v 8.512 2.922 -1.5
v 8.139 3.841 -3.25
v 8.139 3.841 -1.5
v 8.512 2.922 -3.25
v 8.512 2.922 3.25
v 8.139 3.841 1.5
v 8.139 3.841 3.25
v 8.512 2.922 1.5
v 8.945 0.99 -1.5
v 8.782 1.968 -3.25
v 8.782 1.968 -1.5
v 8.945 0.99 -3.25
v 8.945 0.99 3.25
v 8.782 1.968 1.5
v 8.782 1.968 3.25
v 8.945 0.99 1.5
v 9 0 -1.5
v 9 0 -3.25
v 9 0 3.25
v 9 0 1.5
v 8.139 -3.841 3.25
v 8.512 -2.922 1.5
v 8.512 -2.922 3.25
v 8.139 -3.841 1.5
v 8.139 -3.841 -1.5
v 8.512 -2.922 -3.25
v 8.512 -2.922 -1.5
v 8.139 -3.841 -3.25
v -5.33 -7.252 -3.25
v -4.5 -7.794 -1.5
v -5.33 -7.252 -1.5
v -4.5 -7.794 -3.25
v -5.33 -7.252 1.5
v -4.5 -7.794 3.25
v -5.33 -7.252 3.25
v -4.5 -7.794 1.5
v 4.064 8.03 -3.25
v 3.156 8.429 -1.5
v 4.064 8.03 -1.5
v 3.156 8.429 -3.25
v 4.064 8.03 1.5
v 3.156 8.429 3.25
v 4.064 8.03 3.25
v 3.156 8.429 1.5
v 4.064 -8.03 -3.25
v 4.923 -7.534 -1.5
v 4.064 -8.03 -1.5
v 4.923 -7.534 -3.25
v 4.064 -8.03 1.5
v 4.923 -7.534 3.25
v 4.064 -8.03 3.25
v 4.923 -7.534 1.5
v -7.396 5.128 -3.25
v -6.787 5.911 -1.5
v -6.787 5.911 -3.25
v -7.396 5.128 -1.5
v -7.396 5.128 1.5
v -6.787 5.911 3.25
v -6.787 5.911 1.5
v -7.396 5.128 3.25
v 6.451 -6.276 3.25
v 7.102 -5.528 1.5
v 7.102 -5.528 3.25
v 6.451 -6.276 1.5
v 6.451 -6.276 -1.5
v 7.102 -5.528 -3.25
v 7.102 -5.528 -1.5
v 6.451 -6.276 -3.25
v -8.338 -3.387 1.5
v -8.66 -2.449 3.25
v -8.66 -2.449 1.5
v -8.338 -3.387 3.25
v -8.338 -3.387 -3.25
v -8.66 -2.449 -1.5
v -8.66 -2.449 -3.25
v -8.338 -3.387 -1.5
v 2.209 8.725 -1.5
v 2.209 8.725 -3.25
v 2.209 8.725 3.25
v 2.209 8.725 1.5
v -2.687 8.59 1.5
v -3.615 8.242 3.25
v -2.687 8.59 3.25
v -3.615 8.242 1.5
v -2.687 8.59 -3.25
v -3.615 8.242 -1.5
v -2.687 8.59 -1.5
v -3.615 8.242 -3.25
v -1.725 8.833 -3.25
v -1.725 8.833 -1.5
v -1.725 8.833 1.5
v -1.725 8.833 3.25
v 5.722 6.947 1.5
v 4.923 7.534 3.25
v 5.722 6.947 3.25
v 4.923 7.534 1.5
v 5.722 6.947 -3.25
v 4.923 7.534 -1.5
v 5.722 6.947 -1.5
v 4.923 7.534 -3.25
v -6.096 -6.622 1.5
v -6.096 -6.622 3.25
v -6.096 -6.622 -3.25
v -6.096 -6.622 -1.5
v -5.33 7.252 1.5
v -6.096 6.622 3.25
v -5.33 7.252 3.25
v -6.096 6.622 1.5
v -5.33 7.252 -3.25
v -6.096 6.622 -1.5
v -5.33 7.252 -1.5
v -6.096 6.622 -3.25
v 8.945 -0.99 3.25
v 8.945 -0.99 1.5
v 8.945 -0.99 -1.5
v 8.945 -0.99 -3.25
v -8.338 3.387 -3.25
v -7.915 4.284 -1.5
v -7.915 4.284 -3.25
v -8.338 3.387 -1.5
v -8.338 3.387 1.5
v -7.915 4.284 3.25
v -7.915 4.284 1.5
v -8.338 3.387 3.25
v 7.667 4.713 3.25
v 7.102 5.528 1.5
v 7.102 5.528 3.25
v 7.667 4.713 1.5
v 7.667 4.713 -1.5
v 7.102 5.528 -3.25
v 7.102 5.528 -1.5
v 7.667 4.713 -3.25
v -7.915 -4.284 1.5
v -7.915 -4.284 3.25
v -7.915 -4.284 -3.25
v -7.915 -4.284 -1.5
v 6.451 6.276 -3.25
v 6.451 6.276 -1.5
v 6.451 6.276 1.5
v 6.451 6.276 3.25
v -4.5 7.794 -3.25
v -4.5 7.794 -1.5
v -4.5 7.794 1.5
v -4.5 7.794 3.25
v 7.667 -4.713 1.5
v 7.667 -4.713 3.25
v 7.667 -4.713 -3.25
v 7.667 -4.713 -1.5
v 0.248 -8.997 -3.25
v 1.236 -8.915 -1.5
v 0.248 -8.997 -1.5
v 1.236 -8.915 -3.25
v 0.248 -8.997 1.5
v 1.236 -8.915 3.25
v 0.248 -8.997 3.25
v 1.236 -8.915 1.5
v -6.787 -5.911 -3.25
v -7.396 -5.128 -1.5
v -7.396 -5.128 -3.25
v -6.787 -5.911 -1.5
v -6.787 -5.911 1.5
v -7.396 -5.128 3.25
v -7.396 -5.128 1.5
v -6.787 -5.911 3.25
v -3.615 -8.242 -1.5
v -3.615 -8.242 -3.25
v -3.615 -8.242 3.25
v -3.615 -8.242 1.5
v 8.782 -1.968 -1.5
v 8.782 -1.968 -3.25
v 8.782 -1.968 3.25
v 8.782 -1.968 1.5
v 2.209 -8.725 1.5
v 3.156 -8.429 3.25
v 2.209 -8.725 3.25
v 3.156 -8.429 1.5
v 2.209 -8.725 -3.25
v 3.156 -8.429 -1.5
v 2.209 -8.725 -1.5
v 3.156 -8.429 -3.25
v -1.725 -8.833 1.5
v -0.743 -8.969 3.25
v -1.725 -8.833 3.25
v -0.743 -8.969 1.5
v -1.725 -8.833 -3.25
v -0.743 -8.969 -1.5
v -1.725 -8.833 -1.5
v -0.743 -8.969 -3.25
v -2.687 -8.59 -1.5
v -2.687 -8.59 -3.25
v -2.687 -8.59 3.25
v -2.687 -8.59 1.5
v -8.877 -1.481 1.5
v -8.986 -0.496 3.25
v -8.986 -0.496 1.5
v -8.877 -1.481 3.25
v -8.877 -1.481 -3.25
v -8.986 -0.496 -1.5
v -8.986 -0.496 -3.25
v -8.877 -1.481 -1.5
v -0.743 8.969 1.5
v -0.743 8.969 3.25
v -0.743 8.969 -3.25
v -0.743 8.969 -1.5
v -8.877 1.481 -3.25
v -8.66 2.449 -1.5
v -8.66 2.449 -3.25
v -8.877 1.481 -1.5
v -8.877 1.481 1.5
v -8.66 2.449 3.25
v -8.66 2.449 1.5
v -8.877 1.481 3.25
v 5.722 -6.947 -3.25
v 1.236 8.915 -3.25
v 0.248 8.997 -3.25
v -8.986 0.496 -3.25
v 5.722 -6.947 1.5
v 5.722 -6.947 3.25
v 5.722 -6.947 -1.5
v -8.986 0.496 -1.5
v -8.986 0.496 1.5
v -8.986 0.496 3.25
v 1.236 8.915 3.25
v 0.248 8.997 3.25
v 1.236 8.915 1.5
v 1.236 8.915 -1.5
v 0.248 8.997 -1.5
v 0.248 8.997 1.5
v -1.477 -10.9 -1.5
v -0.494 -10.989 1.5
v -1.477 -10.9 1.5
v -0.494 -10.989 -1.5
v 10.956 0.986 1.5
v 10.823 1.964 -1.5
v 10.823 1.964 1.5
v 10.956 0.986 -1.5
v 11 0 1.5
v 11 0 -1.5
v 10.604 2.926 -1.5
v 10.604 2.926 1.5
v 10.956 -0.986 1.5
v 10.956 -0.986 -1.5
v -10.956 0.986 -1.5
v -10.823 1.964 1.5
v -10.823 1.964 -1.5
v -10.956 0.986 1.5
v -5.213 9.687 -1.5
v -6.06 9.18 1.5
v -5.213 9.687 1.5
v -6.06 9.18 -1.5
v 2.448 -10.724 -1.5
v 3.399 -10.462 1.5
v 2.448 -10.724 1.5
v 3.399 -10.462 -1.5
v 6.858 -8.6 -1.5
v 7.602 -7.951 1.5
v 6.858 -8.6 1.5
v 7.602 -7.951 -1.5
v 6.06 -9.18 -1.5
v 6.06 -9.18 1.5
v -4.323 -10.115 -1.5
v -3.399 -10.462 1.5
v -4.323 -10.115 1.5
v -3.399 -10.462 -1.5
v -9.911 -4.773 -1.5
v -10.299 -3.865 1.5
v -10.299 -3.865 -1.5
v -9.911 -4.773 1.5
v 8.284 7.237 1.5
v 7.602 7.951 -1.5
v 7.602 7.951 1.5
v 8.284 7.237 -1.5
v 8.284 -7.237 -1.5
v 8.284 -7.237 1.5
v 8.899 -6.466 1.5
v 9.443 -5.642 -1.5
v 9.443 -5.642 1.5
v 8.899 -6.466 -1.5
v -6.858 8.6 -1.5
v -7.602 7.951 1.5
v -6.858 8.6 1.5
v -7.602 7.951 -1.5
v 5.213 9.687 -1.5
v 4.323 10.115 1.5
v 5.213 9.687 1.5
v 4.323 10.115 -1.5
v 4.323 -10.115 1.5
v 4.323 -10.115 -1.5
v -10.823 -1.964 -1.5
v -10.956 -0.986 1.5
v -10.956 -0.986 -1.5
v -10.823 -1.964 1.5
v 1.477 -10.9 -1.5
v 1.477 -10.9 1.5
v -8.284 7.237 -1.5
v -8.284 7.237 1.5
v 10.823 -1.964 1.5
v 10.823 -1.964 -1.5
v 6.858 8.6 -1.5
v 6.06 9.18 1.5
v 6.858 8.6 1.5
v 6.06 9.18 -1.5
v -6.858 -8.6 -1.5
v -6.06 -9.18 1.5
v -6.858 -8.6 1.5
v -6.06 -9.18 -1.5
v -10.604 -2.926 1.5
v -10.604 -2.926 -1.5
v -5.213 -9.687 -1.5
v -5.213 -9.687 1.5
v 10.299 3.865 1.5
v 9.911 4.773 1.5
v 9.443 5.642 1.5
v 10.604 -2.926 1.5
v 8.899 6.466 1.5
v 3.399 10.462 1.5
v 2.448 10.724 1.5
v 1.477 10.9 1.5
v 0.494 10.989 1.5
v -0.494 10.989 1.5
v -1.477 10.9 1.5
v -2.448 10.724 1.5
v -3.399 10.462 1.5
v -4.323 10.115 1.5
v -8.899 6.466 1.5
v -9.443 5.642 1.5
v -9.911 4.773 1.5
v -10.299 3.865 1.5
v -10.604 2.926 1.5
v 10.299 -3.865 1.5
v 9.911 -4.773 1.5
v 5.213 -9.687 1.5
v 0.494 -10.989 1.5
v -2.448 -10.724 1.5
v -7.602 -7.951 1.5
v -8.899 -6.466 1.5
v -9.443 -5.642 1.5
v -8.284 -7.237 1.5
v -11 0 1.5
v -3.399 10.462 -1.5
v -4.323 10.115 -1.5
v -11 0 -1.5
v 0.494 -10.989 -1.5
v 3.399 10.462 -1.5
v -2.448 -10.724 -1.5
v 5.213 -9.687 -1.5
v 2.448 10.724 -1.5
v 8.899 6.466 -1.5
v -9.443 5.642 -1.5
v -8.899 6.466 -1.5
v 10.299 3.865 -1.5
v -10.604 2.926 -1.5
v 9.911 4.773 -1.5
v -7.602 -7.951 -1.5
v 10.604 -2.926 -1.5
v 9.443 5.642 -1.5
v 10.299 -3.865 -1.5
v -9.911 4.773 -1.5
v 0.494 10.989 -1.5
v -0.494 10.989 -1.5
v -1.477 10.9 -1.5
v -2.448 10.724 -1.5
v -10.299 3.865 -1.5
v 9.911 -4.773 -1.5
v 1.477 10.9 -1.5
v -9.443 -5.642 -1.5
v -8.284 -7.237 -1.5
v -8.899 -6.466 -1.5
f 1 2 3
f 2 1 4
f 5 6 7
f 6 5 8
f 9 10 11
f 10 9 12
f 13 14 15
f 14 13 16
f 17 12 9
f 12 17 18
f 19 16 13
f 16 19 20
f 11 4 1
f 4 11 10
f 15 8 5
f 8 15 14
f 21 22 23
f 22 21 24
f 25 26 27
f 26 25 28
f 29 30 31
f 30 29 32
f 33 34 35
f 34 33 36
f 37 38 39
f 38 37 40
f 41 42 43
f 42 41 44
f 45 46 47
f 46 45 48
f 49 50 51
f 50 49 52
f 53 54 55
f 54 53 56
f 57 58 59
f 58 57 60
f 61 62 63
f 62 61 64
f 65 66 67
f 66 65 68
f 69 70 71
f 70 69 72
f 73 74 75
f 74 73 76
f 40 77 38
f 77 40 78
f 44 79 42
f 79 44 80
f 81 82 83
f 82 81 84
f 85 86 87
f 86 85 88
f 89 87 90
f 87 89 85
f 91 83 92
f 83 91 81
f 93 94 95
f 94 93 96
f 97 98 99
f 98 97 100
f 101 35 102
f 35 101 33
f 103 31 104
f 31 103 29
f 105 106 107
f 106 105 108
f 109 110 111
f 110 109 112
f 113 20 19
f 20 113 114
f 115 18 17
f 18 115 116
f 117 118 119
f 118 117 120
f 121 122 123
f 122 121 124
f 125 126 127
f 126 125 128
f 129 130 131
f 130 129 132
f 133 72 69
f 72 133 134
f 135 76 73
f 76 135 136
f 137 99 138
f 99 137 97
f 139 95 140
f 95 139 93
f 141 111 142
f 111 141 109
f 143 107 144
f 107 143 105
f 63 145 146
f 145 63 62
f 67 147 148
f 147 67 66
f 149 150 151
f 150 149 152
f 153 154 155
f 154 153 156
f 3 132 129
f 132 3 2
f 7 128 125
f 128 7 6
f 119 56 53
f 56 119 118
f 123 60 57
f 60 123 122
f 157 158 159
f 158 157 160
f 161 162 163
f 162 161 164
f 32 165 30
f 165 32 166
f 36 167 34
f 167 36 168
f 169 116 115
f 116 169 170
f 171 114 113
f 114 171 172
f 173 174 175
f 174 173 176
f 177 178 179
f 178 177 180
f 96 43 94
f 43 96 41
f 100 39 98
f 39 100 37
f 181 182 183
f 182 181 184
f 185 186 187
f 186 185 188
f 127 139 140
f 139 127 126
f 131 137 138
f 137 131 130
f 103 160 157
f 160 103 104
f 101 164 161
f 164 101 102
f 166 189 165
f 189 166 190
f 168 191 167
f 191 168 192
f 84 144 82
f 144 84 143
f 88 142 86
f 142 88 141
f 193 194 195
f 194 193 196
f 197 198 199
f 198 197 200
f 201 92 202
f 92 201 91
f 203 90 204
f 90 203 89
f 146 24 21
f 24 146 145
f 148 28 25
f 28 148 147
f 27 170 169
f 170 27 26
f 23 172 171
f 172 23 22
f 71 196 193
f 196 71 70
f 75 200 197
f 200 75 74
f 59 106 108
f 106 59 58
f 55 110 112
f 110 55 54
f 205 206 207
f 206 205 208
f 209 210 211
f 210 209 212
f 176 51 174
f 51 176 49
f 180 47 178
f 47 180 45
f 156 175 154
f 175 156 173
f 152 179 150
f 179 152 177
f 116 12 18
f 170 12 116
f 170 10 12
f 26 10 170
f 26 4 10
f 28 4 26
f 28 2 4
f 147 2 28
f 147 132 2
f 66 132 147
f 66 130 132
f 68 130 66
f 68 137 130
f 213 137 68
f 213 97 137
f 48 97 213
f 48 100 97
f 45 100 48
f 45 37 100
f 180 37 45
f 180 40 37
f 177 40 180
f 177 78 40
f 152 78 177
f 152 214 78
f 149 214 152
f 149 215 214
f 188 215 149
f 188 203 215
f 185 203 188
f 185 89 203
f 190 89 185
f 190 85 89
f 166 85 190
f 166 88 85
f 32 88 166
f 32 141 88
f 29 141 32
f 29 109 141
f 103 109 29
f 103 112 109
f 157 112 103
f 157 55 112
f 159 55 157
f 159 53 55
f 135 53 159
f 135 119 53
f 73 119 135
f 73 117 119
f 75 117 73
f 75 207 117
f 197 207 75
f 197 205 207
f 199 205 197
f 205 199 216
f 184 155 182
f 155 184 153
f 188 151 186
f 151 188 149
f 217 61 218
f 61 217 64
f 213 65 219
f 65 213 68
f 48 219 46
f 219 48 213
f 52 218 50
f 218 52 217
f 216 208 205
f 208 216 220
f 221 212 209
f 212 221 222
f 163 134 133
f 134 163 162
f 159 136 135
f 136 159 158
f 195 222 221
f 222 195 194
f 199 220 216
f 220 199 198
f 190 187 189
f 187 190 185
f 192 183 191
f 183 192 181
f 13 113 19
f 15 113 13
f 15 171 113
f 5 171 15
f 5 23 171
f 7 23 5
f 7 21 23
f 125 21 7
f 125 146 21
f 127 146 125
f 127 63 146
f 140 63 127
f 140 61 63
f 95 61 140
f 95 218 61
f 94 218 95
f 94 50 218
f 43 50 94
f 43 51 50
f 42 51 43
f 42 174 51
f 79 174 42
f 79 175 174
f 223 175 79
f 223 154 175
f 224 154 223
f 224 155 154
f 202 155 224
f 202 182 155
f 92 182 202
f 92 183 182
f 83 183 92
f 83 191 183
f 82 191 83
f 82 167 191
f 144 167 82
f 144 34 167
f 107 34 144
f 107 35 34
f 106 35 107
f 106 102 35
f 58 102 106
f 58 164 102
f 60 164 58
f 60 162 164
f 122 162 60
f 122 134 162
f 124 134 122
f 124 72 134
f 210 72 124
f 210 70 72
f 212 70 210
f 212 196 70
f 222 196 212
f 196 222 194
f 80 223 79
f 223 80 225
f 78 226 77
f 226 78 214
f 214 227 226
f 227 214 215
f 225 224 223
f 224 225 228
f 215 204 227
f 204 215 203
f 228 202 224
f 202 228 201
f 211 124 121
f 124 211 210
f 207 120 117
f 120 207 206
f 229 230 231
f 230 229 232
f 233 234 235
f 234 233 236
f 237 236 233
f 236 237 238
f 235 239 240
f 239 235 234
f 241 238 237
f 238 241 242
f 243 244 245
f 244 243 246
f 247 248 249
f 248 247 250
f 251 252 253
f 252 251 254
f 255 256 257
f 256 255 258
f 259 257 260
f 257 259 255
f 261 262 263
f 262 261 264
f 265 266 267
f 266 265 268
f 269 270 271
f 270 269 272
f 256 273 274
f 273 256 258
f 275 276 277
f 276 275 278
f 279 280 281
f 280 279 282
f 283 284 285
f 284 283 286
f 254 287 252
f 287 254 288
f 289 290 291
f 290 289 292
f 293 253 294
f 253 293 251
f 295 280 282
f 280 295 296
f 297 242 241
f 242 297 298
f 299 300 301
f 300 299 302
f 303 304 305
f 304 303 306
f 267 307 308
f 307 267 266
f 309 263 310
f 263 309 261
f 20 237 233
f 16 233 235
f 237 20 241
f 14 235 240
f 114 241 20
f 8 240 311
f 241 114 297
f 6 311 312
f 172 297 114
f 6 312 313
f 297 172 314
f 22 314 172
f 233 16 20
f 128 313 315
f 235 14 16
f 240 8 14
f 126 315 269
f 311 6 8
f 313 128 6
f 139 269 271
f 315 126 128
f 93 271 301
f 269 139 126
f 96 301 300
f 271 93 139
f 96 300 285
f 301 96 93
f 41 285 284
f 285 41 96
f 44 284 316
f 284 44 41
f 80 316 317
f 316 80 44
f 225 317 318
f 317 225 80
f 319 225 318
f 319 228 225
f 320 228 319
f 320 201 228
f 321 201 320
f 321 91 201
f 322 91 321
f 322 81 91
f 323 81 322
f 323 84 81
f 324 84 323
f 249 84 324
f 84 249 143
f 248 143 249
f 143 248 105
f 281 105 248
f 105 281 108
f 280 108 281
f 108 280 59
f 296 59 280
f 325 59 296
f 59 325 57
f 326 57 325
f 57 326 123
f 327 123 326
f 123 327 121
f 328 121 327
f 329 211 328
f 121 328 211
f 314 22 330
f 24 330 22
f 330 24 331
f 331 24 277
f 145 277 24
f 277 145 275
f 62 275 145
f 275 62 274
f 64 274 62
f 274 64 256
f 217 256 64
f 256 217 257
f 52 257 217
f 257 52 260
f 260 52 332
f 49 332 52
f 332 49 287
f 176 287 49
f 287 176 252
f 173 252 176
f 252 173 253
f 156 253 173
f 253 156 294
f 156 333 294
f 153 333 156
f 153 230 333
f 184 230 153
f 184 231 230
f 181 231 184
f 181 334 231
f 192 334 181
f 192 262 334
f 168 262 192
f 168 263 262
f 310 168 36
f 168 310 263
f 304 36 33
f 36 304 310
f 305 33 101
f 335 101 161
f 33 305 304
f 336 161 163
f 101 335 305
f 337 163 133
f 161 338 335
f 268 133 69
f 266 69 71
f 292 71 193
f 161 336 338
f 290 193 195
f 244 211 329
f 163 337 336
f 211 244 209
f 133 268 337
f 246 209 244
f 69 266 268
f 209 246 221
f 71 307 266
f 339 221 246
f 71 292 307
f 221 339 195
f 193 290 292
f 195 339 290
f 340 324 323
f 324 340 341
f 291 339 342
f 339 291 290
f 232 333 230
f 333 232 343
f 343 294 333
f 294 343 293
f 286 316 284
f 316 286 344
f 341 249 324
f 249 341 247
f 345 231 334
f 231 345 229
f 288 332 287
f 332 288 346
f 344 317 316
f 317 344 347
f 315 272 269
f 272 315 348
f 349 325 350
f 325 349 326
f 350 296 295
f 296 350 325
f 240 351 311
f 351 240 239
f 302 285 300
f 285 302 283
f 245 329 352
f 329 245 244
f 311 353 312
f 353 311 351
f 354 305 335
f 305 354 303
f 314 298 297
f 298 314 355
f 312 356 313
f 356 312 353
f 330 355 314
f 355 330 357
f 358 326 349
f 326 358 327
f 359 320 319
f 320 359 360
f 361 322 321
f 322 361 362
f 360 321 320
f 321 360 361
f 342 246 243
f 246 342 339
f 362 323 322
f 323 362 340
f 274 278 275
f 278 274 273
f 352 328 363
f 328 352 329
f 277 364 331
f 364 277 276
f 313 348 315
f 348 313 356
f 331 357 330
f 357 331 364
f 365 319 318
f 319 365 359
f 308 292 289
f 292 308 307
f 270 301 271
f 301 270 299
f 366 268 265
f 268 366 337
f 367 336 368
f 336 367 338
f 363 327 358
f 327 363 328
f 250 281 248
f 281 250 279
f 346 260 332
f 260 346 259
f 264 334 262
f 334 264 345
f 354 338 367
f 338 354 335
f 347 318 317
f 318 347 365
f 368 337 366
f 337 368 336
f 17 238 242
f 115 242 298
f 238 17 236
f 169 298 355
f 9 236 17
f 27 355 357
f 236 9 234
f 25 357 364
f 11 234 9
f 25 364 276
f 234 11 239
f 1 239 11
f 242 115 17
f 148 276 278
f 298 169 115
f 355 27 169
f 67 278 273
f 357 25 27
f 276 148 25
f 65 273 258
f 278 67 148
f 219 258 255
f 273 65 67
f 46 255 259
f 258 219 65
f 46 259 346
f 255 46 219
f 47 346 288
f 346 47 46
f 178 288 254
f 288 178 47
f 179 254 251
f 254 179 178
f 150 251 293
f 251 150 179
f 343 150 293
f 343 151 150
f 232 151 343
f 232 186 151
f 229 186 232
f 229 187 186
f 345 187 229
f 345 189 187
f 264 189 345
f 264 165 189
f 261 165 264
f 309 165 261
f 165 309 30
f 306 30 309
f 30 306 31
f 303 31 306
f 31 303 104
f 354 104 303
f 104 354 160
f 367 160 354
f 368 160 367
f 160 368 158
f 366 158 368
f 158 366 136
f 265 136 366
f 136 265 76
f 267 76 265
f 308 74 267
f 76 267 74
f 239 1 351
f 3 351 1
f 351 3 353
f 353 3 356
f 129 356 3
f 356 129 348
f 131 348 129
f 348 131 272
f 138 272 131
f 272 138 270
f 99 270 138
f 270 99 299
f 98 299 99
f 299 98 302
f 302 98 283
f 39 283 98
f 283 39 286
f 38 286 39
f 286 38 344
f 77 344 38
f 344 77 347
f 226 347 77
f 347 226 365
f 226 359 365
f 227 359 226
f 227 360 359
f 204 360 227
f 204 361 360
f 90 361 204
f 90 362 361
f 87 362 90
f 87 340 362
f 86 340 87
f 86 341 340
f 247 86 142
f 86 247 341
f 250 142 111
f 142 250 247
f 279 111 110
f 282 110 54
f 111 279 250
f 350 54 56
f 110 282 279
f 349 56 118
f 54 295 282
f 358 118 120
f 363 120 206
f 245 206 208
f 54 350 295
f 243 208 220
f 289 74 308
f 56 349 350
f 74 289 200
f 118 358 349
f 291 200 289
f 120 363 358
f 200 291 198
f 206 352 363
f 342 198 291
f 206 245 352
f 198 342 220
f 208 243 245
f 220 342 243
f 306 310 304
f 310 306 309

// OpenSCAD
$fa = 1;
$fs = 1;

cylinder(h=6.5, d=18, center=true);
cylinder(h=3, d=22, center=true);
